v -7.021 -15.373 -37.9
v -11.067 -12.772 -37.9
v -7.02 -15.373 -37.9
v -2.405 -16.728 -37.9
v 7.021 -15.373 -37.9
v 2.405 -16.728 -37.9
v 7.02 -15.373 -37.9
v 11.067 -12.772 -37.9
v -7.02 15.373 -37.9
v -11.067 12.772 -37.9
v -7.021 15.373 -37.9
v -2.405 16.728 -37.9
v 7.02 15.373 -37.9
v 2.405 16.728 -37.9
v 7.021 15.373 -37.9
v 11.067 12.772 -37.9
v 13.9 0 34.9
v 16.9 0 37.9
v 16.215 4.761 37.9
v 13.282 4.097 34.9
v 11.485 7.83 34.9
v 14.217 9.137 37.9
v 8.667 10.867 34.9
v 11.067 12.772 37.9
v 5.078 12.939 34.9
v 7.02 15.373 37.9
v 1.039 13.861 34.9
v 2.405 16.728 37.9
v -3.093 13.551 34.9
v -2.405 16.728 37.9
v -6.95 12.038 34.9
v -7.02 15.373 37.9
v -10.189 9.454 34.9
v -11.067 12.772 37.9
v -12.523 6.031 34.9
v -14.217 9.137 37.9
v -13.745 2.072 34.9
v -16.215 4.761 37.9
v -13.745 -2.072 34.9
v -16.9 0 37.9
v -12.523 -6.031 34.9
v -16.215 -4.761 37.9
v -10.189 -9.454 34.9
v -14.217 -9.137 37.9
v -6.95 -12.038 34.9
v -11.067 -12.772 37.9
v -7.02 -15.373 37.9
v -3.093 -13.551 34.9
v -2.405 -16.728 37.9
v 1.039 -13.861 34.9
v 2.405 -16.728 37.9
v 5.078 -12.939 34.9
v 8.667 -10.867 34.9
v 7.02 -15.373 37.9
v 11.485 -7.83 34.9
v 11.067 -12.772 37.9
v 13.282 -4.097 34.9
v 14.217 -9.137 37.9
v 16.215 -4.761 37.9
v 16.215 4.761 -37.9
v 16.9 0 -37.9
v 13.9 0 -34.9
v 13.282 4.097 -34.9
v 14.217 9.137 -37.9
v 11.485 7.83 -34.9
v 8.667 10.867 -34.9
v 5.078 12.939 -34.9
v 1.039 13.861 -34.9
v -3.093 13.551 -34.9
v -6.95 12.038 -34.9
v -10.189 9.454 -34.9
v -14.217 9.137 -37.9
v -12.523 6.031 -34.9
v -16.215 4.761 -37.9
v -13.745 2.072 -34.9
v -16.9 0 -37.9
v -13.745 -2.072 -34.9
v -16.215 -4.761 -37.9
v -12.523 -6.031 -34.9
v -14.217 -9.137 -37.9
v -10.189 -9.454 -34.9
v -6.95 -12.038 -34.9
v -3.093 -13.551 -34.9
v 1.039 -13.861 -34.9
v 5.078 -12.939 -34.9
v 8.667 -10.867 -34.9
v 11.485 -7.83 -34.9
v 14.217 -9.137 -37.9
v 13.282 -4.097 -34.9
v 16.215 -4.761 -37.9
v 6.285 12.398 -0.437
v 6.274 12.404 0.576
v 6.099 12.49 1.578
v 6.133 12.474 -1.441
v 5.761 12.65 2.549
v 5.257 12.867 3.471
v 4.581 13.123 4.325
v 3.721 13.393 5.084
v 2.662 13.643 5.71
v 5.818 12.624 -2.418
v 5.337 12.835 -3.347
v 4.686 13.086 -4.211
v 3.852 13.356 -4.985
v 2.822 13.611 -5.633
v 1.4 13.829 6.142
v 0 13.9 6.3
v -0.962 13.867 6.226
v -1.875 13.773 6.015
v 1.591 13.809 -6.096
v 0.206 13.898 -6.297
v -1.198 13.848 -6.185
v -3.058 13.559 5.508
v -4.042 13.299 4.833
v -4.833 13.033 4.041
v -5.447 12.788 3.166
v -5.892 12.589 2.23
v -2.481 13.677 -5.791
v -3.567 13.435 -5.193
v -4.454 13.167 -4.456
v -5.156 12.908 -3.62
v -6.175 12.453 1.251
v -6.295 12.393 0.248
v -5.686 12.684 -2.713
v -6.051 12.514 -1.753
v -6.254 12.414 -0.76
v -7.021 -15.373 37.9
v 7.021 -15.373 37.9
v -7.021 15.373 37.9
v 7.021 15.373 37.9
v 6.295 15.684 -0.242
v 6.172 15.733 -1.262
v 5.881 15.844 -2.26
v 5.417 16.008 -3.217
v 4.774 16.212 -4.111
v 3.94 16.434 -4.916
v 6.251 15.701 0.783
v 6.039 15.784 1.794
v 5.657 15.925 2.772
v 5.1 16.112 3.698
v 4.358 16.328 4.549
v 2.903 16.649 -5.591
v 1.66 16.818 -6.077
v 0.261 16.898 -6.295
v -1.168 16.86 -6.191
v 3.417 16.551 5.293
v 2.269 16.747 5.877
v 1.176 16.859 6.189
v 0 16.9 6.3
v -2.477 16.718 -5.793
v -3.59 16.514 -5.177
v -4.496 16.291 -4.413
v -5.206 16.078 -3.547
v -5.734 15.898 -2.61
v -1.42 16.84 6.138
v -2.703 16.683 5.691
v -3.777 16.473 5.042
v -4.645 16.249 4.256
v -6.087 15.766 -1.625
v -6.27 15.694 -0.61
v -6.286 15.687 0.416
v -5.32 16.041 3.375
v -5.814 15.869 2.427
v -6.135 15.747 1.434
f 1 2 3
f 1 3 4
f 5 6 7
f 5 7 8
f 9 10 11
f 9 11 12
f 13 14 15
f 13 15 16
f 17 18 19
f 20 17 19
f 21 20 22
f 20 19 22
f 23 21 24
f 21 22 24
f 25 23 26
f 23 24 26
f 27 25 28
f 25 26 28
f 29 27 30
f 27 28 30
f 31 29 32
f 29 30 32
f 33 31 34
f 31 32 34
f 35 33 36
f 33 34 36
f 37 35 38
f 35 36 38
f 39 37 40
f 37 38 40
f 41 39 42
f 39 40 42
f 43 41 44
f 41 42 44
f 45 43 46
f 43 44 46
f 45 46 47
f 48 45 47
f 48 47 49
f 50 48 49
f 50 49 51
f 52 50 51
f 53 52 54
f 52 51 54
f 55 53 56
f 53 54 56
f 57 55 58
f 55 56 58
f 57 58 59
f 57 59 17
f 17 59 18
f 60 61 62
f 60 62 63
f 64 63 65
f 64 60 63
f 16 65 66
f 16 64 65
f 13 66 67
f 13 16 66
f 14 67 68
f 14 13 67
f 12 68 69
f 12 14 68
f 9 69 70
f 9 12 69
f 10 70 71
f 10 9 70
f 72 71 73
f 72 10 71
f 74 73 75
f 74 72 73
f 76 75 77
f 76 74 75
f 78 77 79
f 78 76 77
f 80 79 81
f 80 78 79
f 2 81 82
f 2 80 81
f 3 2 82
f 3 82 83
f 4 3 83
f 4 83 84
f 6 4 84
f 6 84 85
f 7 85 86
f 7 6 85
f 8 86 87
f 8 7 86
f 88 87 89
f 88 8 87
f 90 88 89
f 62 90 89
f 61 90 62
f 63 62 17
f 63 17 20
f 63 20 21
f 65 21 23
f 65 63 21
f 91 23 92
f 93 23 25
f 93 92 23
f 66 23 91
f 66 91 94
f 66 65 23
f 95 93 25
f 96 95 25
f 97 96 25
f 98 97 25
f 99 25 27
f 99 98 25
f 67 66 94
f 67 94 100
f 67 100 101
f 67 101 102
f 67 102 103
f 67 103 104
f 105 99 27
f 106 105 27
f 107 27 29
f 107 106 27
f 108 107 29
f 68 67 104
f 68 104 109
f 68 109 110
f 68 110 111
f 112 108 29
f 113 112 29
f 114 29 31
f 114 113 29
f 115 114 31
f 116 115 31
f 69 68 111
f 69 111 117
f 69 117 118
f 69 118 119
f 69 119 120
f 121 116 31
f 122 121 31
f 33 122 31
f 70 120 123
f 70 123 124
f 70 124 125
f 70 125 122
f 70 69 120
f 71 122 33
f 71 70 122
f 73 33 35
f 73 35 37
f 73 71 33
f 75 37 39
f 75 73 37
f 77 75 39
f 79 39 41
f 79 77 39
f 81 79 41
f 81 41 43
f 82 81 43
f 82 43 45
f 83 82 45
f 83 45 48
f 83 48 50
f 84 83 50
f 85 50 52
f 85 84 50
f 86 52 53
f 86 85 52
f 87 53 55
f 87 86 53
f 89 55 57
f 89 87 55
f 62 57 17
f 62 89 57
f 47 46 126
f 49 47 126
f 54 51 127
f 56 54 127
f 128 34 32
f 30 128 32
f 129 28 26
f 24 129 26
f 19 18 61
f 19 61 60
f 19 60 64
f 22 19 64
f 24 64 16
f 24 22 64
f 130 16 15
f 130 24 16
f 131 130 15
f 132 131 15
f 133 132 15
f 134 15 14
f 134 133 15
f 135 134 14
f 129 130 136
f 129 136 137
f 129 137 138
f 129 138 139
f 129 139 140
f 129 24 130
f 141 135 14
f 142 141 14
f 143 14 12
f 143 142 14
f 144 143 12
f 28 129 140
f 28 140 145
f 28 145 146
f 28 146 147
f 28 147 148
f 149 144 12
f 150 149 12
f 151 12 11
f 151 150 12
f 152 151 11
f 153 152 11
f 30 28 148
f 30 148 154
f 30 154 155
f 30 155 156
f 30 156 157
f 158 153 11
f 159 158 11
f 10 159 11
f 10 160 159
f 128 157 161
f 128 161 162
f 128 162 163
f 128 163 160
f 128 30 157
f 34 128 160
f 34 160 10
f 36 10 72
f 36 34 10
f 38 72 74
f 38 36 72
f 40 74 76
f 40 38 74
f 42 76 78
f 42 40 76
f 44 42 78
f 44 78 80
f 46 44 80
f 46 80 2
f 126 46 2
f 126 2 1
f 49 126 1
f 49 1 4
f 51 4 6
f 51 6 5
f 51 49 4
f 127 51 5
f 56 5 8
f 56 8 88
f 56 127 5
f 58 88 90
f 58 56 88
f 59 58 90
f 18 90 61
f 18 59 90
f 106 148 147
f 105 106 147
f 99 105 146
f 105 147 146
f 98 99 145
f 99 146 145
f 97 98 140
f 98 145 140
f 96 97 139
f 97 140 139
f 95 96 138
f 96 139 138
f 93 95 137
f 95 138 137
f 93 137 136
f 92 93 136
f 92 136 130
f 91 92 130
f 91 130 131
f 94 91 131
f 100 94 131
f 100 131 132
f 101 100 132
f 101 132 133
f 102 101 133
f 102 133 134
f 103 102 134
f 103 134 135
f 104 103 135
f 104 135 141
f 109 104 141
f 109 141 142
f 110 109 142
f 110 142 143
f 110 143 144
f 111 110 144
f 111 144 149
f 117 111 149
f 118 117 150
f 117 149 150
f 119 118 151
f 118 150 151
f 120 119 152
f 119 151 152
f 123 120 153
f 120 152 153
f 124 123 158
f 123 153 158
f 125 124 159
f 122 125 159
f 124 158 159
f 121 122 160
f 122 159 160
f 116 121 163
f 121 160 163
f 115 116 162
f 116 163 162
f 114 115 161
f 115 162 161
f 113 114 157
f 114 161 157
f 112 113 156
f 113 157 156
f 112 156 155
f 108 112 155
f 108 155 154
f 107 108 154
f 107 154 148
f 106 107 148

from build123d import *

# Parameters (mm, degrees)
CROQUIS1_R              = 16.9
CROQUIS1_R_2            = 13.9
SALIENTE_EXTRUIR1_DEPTH = 37.9
CROQUIS2_R              = 6.3
CORTAR_EXTRUIR1_DEPTH   = 20.8
CHAFL_N1_SIZE           = 3


with BuildPart() as part:
    # Croquis1 → Saliente-Extruir1 (new, symmetric)
    with BuildSketch(Plane.XY):
        Circle(CROQUIS1_R)
        Circle(CROQUIS1_R_2, mode=Mode.SUBTRACT)
    extrude(amount=SALIENTE_EXTRUIR1_DEPTH, both=True)

    # Croquis2 → Cortar-Extruir1 (cut)
    with BuildSketch(Plane(origin=(0, 16.9, 0), x_dir=(1, 0, 0), z_dir=(0, 1, 0))):
        with Locations(Location((0, 0, 0), (0, 0, 270))):
            Circle(CROQUIS2_R)
    extrude(amount=-CORTAR_EXTRUIR1_DEPTH, mode=Mode.SUBTRACT)

    # Chaflán1
    chafl_n1_edges = [part.edges().sort_by_distance(p)[0] for p in [
        (-13.9, 0, -37.9),
        (-13.9, 0, 37.9),
    ]]
    chamfer(chafl_n1_edges, length=CHAFL_N1_SIZE - 0.0001)  # a hair under: the kernel refuses the full size


solid = part.part
